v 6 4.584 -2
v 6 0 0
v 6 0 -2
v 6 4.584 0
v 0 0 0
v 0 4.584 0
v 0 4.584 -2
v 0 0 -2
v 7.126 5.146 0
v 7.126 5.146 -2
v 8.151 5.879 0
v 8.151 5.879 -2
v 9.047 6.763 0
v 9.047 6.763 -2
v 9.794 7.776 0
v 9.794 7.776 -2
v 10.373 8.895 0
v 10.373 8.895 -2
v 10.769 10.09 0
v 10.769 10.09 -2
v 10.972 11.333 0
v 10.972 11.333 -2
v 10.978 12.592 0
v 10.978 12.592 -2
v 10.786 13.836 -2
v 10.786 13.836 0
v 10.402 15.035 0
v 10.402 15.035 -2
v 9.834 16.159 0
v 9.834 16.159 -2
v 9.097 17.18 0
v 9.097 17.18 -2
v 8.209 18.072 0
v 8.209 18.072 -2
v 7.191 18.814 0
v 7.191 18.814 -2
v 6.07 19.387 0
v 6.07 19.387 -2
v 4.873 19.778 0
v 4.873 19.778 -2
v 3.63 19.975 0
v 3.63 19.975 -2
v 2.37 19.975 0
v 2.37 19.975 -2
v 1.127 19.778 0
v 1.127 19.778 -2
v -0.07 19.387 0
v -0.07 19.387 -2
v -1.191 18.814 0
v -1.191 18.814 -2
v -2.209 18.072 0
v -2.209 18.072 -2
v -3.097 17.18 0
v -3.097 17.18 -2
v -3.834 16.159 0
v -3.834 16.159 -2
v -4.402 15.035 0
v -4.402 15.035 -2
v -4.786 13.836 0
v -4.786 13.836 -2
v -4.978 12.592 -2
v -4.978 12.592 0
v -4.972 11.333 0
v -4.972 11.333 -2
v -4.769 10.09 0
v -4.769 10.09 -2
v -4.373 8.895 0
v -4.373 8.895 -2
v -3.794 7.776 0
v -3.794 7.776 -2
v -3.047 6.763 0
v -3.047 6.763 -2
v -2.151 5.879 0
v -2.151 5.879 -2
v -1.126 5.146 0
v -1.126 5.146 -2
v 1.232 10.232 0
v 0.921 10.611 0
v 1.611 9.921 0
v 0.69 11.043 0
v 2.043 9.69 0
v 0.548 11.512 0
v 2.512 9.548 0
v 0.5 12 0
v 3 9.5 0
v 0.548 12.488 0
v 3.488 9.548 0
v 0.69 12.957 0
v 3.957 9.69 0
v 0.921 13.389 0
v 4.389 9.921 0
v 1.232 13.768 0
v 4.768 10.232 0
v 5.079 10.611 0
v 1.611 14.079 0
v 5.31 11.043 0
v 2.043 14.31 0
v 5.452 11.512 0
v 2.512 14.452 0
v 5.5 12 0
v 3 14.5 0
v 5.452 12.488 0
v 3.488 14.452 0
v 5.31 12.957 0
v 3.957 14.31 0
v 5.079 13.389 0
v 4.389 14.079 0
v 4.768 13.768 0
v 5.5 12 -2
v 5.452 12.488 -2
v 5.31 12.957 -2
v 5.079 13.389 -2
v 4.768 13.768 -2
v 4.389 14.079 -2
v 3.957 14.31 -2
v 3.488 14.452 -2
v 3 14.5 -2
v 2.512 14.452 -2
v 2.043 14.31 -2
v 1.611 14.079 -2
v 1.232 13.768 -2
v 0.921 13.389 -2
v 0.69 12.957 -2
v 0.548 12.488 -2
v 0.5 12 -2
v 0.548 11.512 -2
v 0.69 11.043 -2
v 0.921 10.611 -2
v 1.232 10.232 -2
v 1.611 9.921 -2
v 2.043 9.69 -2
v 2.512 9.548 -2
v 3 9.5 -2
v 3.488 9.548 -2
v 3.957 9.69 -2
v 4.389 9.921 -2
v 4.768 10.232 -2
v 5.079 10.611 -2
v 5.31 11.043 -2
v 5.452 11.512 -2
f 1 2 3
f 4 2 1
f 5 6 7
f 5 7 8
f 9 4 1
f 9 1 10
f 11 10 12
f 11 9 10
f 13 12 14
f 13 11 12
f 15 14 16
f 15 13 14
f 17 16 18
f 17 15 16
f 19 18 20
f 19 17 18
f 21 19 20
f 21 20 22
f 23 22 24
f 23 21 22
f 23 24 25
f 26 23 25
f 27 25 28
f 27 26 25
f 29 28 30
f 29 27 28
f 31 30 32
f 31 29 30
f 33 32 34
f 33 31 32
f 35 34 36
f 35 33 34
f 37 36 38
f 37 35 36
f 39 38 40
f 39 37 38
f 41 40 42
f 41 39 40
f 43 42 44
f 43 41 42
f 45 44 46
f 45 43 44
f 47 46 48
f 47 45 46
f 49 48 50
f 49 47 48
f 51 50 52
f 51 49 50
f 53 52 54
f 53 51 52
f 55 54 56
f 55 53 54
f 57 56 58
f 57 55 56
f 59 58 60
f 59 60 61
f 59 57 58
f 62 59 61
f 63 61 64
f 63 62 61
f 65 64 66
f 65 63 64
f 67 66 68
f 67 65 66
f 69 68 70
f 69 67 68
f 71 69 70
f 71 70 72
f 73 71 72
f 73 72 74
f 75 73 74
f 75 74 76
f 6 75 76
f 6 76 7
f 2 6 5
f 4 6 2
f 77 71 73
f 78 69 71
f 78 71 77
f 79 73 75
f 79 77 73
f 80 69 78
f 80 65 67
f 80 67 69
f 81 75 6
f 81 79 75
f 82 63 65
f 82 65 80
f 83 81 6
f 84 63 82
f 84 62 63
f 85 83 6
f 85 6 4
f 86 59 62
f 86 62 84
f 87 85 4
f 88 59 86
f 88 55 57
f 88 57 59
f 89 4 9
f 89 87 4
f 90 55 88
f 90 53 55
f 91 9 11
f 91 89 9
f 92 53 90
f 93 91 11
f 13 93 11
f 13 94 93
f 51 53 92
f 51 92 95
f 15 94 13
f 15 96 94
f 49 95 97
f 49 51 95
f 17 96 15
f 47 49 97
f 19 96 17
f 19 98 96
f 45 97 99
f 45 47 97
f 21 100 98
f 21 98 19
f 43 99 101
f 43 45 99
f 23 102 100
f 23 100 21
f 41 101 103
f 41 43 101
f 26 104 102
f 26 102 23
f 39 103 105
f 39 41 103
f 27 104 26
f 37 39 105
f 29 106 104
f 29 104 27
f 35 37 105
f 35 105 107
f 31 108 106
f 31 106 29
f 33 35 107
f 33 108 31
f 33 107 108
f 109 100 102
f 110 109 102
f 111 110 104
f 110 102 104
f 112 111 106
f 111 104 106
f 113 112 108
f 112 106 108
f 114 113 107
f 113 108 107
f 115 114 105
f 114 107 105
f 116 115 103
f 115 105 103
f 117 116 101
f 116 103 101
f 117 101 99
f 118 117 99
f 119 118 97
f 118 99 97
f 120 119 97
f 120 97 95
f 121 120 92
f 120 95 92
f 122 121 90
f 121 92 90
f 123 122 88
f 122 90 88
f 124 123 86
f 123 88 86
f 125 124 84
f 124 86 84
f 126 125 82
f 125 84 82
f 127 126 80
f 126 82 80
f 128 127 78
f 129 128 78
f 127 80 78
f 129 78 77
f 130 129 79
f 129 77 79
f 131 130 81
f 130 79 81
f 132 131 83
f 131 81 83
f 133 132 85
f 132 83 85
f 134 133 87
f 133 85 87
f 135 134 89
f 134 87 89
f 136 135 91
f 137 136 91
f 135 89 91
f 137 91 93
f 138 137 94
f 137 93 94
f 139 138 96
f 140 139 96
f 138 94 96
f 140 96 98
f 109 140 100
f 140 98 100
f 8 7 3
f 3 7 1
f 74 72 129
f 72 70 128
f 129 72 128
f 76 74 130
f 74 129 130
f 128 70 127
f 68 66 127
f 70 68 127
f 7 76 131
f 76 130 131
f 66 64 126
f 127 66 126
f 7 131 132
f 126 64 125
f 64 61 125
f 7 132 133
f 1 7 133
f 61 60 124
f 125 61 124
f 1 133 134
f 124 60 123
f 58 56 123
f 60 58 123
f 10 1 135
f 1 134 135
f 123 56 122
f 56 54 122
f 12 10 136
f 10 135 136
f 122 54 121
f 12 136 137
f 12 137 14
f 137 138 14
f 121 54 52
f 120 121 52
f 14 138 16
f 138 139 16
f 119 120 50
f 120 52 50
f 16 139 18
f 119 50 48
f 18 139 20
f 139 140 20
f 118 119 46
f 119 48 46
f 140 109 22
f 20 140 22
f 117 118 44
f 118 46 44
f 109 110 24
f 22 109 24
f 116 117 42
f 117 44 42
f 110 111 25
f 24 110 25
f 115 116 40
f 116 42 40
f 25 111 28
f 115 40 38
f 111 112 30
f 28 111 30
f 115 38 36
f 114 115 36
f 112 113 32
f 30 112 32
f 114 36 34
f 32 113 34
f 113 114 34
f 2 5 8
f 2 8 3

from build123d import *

# Parameters (mm, degrees)
BASE_EXTRUSION_DEPTH    = 2
ESQUISSE2_R             = 2.5
ENL_V_MAT_EXTRU_1_DEPTH = 2


with BuildPart() as part:
    # Esquisse1 → Base-Extrusion (new body)
    with BuildSketch(Plane.XY):
        with BuildLine():
            Line((0, 0), (6, 0))
            Line((6, 0), (6, 4.583801513))
            ThreePointArc((6, 4.583801513), (3, 20), (0, 4.583801513))
            Line((0, 4.583801513), (0, 0))
        make_face()
    extrude(amount=-BASE_EXTRUSION_DEPTH)

    # Esquisse2 → Enlèv. mat.-Extru.1 (cut)
    with BuildSketch(Plane.XY):
        with Locations((3, 12)):
            Circle(ESQUISSE2_R)
    extrude(amount=-ENL_V_MAT_EXTRU_1_DEPTH, mode=Mode.SUBTRACT)


solid = part.part
